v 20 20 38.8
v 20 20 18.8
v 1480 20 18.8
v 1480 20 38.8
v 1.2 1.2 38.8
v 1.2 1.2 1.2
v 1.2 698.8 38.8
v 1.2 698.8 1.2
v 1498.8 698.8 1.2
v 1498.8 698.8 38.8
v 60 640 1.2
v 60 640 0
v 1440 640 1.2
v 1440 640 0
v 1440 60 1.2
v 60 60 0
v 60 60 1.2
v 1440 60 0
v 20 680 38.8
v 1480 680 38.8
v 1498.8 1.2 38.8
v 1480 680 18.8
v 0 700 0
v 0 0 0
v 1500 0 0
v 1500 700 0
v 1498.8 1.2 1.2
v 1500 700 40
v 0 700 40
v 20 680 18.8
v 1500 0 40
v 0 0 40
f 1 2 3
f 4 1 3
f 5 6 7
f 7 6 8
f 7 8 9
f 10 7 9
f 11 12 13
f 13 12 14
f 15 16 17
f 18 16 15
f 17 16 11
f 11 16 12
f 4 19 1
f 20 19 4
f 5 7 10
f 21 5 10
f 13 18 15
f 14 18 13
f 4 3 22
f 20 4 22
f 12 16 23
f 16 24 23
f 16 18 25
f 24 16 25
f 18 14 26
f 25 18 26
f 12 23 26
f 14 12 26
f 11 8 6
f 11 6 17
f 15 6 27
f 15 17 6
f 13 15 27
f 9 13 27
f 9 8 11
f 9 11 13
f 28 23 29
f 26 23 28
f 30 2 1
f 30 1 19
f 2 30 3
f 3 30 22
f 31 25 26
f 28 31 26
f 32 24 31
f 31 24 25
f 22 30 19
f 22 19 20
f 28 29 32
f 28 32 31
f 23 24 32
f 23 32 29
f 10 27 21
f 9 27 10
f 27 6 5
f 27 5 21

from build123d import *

# Parameters (mm, degrees)
F1_W     = 1500
F1_H     = 700
F1_W_2   = 1380
F1_H_2   = 580
F2_DEPTH = 40
F3_T     = -1.2
F4_DEPTH = 1.2
F6_START = 18.8
F5_W     = 1460
F5_H     = 660
F6_DEPTH = 20


with BuildPart() as f2:
    # F1 (on Top) → F2 (new body)
    with BuildSketch(Plane.XY):
        with Locations((750, 350)):
            Rectangle(F1_W, F1_H)
        with Locations((750, 350)):
            Rectangle(F1_W_2, F1_H_2, mode=Mode.SUBTRACT)
        with Locations((750, 350)):
            Rectangle(F1_W_2, F1_H_2)
    extrude(amount=F2_DEPTH)

    # F3
    f3_openings = [f2.faces().sort_by_distance(p)[0] for p in [
        (750, 350, 0),
    ]]
    offset(amount=F3_T, openings=f3_openings)

    # F1 (on Top) → F4 (join)
    with BuildSketch(Plane.XY):
        with Locations((750, 350)):
            Rectangle(F1_W, F1_H)
        with Locations((750, 350)):
            Rectangle(F1_W_2, F1_H_2, mode=Mode.SUBTRACT)
    extrude(amount=F4_DEPTH)


with BuildPart() as f6:
    # F5 (on Top) → F6 (new body)
    with BuildSketch(Plane.XY.offset(F6_START)):
        with Locations((750, 350)):
            Rectangle(F5_W, F5_H)
    extrude(amount=F6_DEPTH)


solid = Compound([f2.part, f6.part])
